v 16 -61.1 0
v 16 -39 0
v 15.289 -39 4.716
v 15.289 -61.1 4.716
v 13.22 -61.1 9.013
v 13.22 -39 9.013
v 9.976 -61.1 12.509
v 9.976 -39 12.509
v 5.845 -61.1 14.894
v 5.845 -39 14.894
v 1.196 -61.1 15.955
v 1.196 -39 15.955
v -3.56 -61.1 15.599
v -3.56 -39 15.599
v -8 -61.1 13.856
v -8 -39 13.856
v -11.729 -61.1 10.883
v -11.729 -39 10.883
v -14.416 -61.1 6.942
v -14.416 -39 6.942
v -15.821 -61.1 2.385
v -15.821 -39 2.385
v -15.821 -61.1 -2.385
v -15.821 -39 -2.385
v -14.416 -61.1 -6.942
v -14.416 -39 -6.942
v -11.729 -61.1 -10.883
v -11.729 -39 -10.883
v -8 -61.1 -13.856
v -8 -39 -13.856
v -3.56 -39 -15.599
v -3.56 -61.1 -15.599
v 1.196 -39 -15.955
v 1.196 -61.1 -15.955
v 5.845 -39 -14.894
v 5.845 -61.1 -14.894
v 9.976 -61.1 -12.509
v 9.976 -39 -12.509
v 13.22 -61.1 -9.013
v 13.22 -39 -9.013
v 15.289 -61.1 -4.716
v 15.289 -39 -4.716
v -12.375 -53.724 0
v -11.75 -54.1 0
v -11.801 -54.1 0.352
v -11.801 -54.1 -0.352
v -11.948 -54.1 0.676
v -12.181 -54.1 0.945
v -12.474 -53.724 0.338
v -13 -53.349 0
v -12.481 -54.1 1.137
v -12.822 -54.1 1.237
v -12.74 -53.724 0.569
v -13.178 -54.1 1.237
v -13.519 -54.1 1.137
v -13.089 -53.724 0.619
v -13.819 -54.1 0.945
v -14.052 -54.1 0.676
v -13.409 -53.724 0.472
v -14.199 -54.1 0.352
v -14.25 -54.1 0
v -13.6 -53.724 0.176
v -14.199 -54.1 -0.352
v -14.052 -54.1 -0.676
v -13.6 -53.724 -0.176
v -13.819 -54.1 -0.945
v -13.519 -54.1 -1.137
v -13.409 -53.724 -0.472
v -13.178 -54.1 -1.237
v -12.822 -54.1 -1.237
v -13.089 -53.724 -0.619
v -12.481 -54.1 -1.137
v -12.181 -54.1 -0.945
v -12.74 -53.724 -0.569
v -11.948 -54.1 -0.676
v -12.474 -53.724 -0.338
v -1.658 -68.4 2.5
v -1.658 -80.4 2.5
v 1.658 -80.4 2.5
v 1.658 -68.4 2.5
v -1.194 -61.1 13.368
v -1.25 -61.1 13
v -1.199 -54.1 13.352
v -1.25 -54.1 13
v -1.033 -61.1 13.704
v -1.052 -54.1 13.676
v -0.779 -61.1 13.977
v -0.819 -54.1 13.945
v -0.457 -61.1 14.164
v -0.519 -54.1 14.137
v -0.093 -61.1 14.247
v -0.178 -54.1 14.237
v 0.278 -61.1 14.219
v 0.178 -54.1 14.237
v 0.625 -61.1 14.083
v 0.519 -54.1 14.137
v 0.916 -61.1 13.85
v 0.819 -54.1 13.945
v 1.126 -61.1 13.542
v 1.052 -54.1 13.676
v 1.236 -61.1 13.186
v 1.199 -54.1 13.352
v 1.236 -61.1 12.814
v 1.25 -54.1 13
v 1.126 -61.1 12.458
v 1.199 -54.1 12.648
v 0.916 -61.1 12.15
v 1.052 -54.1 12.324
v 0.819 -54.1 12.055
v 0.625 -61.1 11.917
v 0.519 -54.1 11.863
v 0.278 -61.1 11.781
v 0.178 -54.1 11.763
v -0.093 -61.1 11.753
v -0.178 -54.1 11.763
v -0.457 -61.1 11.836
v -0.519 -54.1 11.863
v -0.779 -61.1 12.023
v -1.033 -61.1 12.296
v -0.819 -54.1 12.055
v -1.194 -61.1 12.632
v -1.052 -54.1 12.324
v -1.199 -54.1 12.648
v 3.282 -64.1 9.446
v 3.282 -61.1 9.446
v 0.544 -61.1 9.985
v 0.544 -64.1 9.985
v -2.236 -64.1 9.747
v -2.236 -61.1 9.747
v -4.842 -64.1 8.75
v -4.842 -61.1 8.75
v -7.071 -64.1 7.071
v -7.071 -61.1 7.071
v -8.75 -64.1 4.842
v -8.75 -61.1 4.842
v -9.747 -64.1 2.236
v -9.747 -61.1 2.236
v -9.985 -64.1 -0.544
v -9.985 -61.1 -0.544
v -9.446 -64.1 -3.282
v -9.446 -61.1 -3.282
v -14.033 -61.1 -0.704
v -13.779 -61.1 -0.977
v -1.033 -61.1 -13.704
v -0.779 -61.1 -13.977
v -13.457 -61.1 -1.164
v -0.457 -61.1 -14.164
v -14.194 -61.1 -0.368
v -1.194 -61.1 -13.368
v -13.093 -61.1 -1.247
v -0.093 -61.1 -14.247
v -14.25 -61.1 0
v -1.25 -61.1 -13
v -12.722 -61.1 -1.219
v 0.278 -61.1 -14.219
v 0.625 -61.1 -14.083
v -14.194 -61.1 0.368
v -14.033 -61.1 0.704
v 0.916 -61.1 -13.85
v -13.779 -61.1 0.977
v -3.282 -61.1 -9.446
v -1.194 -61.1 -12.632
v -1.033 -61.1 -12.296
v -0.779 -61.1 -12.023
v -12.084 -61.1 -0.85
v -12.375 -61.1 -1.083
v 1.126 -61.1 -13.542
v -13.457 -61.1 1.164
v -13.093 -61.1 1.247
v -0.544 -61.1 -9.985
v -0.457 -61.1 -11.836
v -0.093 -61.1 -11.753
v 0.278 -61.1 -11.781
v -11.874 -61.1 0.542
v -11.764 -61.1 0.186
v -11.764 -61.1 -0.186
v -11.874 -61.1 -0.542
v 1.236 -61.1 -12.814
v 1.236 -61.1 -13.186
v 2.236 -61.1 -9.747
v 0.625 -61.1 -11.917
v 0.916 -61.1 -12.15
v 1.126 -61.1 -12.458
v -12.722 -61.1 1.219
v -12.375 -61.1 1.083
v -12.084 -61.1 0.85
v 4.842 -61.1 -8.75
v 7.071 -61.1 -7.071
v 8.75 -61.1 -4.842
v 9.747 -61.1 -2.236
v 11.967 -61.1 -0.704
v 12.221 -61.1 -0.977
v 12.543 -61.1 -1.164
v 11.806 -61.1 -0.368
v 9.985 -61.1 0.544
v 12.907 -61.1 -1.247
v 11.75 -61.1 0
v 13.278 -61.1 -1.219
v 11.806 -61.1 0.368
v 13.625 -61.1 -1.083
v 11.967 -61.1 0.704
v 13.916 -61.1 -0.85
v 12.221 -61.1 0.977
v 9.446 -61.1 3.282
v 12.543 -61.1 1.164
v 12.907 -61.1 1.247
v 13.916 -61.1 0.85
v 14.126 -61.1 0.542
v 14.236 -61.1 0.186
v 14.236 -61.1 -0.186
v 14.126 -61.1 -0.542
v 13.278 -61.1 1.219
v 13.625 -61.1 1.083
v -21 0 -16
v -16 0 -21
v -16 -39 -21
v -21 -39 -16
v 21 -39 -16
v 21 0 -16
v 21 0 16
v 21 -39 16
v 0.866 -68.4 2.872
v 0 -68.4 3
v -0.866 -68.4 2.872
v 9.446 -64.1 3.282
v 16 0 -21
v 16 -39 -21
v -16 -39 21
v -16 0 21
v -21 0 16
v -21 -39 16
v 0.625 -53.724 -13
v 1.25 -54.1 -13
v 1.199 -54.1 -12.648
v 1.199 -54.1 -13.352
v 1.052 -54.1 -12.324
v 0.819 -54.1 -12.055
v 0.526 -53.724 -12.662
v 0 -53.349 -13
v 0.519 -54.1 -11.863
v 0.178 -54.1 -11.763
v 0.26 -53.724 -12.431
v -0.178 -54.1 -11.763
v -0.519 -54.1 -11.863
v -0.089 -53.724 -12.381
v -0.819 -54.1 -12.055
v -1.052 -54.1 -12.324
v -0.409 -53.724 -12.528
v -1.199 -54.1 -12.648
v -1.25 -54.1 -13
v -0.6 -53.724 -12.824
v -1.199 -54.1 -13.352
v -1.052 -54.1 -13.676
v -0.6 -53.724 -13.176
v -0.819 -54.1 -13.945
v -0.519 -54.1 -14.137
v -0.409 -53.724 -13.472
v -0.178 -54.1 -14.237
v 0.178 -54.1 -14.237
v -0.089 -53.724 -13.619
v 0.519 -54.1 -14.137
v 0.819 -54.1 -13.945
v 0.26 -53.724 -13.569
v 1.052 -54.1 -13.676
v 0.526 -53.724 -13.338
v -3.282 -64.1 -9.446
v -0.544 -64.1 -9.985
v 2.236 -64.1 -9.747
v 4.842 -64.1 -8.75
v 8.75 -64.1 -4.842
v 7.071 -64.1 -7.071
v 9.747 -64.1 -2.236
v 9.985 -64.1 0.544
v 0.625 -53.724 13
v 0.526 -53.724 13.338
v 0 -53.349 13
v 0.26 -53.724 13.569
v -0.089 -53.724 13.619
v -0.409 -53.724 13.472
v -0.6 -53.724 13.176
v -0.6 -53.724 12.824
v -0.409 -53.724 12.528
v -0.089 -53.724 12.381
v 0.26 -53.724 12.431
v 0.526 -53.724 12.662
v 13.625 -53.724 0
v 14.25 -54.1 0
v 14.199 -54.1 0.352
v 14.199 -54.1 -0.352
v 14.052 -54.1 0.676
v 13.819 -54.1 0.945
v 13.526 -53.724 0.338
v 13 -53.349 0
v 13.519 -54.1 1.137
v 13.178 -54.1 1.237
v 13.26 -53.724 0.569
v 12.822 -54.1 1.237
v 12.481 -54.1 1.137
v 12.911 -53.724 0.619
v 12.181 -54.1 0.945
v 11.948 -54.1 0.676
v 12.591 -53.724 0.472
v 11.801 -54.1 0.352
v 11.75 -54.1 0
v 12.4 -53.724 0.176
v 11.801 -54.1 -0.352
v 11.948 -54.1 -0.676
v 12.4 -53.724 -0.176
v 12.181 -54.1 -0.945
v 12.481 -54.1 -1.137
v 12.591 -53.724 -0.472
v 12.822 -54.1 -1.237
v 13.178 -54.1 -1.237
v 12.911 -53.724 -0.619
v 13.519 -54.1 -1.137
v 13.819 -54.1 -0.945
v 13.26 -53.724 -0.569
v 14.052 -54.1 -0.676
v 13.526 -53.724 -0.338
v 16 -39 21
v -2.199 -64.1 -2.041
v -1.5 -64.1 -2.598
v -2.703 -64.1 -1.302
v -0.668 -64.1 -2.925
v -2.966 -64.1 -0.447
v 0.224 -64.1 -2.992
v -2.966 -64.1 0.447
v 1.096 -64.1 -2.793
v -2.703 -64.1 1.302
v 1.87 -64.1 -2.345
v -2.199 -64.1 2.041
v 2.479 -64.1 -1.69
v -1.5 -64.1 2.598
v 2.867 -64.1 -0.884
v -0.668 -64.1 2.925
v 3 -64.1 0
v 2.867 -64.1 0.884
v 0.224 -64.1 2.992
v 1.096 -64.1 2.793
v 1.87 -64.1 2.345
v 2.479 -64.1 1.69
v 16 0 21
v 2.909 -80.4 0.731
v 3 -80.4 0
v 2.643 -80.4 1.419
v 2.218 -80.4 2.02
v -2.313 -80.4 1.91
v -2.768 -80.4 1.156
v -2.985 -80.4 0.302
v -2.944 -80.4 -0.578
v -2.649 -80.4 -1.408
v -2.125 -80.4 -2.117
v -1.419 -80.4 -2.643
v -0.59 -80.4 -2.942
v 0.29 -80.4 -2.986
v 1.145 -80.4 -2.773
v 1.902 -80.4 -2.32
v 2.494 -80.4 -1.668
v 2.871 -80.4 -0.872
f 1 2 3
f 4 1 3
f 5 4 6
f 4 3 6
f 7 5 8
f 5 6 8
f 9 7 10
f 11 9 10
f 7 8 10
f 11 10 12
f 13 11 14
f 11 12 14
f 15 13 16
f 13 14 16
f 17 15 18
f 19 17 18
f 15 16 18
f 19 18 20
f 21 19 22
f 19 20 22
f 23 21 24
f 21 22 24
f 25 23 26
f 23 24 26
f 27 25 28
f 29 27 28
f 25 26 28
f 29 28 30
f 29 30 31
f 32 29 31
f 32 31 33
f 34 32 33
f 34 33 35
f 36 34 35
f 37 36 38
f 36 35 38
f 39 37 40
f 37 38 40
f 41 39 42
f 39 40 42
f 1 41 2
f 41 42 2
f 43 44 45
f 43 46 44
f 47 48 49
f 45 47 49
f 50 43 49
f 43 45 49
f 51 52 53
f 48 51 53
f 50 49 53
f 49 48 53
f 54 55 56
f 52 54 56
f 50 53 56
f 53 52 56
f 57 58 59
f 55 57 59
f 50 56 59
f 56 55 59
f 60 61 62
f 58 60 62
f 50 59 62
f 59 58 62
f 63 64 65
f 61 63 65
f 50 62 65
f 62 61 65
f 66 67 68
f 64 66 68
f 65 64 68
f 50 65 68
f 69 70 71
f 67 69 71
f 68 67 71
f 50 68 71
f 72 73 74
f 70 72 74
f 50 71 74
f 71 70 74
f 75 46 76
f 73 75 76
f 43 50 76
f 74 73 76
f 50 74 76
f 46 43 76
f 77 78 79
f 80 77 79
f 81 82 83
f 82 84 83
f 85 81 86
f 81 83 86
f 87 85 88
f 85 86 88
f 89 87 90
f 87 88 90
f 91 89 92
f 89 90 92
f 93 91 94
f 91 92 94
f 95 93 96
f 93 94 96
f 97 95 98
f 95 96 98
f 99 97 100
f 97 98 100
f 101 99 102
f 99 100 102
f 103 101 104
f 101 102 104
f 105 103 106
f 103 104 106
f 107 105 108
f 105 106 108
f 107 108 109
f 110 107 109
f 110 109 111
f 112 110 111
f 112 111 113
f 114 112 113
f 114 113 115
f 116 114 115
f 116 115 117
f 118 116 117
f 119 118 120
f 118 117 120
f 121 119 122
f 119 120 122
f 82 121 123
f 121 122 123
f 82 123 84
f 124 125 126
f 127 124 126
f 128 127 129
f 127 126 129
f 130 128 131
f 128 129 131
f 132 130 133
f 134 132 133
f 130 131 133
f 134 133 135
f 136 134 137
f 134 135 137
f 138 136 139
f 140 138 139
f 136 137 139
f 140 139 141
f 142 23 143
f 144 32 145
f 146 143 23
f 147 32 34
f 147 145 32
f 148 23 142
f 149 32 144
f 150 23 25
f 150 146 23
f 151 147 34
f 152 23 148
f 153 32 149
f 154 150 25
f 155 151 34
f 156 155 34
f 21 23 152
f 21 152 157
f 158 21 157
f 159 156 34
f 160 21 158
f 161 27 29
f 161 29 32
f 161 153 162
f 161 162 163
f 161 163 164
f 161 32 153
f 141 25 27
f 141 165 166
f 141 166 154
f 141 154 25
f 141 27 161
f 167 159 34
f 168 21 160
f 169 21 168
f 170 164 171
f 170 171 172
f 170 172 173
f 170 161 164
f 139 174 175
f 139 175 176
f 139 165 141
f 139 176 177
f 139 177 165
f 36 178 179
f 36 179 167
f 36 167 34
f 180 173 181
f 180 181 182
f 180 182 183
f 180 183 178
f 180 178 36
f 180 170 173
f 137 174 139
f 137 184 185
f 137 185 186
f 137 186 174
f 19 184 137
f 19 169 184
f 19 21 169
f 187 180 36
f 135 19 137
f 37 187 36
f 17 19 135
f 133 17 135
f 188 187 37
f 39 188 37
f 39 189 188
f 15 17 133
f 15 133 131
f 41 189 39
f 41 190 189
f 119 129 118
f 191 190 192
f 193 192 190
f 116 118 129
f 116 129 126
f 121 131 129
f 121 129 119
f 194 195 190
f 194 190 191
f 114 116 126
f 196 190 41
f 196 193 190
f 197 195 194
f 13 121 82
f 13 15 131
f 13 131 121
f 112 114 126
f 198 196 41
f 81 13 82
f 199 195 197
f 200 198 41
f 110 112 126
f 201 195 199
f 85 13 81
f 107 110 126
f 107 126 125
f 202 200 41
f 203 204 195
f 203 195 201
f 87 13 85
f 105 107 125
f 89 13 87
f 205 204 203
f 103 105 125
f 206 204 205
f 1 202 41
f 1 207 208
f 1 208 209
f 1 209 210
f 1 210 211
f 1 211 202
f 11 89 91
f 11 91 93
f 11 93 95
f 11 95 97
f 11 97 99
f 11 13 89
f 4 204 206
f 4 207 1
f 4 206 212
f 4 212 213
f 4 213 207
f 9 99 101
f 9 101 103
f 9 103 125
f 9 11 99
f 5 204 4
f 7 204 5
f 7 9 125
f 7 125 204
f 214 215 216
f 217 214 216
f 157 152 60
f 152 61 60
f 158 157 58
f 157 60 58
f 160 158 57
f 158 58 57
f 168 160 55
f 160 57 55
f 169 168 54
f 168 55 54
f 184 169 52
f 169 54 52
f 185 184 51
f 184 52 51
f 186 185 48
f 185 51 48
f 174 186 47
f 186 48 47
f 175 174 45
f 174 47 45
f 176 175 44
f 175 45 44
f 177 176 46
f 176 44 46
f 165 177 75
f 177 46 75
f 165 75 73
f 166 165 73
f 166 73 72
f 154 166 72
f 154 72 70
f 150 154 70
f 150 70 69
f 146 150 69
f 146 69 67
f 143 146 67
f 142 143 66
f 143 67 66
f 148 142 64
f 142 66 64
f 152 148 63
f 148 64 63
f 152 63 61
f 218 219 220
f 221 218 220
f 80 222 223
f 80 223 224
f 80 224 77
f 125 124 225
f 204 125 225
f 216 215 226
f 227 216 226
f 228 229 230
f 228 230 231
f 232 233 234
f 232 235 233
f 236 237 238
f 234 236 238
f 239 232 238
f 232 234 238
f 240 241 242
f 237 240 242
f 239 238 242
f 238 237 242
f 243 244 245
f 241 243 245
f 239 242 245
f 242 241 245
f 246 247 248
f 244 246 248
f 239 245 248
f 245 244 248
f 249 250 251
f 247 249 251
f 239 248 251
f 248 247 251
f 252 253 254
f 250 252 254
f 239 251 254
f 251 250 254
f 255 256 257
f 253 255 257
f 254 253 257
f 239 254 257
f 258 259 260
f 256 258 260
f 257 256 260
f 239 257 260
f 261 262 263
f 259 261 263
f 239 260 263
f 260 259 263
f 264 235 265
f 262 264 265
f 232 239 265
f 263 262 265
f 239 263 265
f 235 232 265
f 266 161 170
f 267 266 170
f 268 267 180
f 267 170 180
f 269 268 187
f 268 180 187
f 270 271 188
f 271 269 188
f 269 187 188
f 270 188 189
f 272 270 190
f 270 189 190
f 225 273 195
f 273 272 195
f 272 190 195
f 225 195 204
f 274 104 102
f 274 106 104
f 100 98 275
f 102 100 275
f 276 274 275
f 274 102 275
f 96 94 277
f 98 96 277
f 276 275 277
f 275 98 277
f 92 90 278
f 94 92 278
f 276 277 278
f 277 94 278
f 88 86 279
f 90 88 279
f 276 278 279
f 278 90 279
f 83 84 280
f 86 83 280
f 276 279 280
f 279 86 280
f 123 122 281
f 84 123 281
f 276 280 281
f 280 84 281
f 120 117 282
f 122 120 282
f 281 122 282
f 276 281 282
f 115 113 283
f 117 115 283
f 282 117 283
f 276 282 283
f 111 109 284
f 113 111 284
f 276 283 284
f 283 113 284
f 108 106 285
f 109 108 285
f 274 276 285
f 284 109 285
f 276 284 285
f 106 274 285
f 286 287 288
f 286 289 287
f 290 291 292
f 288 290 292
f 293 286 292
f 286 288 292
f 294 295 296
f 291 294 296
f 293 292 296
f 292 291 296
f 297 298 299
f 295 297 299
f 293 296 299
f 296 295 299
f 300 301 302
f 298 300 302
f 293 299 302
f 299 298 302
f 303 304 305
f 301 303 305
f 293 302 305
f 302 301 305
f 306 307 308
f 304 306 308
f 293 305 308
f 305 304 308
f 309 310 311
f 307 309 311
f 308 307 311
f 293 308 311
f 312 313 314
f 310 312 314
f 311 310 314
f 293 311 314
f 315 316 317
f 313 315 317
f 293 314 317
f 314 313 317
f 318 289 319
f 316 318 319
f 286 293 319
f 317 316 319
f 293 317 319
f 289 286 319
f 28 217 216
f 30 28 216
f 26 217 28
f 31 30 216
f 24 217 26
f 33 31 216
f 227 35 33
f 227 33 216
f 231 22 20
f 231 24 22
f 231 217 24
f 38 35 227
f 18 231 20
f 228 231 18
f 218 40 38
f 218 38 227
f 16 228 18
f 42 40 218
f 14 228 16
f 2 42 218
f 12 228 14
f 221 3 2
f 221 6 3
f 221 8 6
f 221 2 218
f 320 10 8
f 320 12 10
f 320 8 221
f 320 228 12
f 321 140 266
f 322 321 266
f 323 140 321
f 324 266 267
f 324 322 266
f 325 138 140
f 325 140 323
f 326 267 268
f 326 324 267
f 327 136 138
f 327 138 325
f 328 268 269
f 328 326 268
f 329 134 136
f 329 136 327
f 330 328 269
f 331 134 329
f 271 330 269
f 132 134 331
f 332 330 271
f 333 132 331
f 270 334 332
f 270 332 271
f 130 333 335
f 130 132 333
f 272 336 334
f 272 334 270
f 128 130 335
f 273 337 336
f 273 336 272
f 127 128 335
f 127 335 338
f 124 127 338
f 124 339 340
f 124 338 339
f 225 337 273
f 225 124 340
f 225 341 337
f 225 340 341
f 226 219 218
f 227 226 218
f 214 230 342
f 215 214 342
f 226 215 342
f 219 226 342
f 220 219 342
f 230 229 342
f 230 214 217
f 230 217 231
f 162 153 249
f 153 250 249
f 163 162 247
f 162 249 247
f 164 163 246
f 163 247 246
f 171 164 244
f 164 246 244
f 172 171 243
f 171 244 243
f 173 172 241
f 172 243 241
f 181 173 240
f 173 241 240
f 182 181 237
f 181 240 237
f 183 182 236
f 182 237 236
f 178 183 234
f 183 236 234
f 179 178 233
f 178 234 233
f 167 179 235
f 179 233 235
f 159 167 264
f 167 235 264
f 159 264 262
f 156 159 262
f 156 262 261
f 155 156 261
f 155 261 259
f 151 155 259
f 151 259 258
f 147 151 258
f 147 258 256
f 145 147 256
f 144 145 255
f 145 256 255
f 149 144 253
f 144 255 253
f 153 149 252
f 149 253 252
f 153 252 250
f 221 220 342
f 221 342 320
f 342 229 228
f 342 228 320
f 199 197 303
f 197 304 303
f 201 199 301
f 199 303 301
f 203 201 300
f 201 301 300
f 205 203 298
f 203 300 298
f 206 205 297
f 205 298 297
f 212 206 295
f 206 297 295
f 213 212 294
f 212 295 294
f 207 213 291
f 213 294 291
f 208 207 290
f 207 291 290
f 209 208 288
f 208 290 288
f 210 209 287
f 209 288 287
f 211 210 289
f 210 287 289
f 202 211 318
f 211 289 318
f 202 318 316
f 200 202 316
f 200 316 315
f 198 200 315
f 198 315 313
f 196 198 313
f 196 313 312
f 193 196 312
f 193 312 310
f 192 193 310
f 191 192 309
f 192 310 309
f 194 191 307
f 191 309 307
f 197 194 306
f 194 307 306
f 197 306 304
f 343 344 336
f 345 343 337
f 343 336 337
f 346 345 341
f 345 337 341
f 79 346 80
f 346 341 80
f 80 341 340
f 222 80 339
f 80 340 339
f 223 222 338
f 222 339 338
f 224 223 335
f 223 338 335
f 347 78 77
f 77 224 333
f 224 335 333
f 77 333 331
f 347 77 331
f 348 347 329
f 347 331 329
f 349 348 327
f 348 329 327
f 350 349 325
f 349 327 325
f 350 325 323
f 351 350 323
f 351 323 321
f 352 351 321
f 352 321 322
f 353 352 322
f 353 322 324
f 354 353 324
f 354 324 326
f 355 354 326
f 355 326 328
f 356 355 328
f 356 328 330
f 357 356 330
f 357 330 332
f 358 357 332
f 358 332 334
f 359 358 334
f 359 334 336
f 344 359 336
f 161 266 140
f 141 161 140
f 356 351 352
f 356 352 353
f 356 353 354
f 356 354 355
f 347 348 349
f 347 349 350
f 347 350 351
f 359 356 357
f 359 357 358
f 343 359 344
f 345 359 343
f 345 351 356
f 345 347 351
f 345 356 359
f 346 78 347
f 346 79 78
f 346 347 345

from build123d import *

# Parameters (mm, degrees)
F0_W      = 42
F0_H      = 42
F1_DEPTH  = 39
F2_R      = 16
F3_DEPTH  = 22.1
F4_R      = 10
F5_DEPTH  = 3
F6_R      = 3
F7_DEPTH  = 16.3
F8_SIZE   = 5
F10_DEPTH = 12
F12_DEPTH = 3
F14_D     = 2.5
F14_DEPTH = 7
F14_TIP   = 0.7510757738


with BuildPart() as f1:
    # F0 (on Front) → F1 (new body)
    with BuildSketch(Plane.XZ):
        Rectangle(F0_W, F0_H)
    extrude(amount=F1_DEPTH)

    # F2 (on face) → F3 (join)
    with BuildSketch(Plane.XZ.offset(39)):
        Circle(F2_R)
    extrude(amount=F3_DEPTH)

    # F4 (on face) → F5 (join)
    with BuildSketch(Plane.XZ.offset(61.1)):
        Circle(F4_R)
    extrude(amount=F5_DEPTH)

    # F6 (on face) → F7 (join)
    with BuildSketch(Plane.XZ.offset(64.1)):
        Circle(F6_R)
    extrude(amount=F7_DEPTH)

    # F8
    f8_edges = [f1.edges().sort_by_distance(p)[0] for p in [
        (-21, -19.5, 21),
        (21, -19.5, 21),
        (21, -19.5, -21),
        (-21, -19.5, -21),
    ]]
    chamfer(f8_edges, length=F8_SIZE)

    # F9 (on face) → F10 (cut)
    with BuildSketch(Plane.XZ.offset(80.4)):
        with BuildLine():
            Line((-1.6583123952, 2.5), (1.6583123952, 2.5))
            ThreePointArc((1.6583123952, 2.5), (0, 3), (-1.6583123952, 2.5))
        make_face()
    extrude(amount=-F10_DEPTH, mode=Mode.SUBTRACT)

    # F11 (on face) → F12 (cut, through all)
    with BuildSketch(Plane.XZ.offset(64.1)):
        with BuildLine():
            Line((3.2817540292, 9.4461680322), (9.4461680322, 3.2817540292))
            ThreePointArc((9.4461680322, 3.2817540292), (7.0710678119, 7.0710678119), (3.2817540292, 9.4461680322))
        make_face()
        with BuildLine():
            ThreePointArc((-9.4461680322, -3.2817540292), (-7.0710678119, -7.0710678119), (-3.2817540292, -9.4461680322))
            Line((-3.2817540292, -9.4461680322), (-9.4461680322, -3.2817540292))
        make_face()
    extrude(amount=-F12_DEPTH, mode=Mode.SUBTRACT)

    # F14
    with Locations(Plane.XZ.offset(61.1)):
        with Locations((0, 13), (-13, 0), (0, -13), (13, 0)):
            Hole(F14_D / 2, depth=F14_DEPTH)
            with Locations((0, 0, -(F14_DEPTH + F14_TIP / 2))):  # 118° drill point
                Cone(0, F14_D / 2, F14_TIP, mode=Mode.SUBTRACT)


solid = f1.part
